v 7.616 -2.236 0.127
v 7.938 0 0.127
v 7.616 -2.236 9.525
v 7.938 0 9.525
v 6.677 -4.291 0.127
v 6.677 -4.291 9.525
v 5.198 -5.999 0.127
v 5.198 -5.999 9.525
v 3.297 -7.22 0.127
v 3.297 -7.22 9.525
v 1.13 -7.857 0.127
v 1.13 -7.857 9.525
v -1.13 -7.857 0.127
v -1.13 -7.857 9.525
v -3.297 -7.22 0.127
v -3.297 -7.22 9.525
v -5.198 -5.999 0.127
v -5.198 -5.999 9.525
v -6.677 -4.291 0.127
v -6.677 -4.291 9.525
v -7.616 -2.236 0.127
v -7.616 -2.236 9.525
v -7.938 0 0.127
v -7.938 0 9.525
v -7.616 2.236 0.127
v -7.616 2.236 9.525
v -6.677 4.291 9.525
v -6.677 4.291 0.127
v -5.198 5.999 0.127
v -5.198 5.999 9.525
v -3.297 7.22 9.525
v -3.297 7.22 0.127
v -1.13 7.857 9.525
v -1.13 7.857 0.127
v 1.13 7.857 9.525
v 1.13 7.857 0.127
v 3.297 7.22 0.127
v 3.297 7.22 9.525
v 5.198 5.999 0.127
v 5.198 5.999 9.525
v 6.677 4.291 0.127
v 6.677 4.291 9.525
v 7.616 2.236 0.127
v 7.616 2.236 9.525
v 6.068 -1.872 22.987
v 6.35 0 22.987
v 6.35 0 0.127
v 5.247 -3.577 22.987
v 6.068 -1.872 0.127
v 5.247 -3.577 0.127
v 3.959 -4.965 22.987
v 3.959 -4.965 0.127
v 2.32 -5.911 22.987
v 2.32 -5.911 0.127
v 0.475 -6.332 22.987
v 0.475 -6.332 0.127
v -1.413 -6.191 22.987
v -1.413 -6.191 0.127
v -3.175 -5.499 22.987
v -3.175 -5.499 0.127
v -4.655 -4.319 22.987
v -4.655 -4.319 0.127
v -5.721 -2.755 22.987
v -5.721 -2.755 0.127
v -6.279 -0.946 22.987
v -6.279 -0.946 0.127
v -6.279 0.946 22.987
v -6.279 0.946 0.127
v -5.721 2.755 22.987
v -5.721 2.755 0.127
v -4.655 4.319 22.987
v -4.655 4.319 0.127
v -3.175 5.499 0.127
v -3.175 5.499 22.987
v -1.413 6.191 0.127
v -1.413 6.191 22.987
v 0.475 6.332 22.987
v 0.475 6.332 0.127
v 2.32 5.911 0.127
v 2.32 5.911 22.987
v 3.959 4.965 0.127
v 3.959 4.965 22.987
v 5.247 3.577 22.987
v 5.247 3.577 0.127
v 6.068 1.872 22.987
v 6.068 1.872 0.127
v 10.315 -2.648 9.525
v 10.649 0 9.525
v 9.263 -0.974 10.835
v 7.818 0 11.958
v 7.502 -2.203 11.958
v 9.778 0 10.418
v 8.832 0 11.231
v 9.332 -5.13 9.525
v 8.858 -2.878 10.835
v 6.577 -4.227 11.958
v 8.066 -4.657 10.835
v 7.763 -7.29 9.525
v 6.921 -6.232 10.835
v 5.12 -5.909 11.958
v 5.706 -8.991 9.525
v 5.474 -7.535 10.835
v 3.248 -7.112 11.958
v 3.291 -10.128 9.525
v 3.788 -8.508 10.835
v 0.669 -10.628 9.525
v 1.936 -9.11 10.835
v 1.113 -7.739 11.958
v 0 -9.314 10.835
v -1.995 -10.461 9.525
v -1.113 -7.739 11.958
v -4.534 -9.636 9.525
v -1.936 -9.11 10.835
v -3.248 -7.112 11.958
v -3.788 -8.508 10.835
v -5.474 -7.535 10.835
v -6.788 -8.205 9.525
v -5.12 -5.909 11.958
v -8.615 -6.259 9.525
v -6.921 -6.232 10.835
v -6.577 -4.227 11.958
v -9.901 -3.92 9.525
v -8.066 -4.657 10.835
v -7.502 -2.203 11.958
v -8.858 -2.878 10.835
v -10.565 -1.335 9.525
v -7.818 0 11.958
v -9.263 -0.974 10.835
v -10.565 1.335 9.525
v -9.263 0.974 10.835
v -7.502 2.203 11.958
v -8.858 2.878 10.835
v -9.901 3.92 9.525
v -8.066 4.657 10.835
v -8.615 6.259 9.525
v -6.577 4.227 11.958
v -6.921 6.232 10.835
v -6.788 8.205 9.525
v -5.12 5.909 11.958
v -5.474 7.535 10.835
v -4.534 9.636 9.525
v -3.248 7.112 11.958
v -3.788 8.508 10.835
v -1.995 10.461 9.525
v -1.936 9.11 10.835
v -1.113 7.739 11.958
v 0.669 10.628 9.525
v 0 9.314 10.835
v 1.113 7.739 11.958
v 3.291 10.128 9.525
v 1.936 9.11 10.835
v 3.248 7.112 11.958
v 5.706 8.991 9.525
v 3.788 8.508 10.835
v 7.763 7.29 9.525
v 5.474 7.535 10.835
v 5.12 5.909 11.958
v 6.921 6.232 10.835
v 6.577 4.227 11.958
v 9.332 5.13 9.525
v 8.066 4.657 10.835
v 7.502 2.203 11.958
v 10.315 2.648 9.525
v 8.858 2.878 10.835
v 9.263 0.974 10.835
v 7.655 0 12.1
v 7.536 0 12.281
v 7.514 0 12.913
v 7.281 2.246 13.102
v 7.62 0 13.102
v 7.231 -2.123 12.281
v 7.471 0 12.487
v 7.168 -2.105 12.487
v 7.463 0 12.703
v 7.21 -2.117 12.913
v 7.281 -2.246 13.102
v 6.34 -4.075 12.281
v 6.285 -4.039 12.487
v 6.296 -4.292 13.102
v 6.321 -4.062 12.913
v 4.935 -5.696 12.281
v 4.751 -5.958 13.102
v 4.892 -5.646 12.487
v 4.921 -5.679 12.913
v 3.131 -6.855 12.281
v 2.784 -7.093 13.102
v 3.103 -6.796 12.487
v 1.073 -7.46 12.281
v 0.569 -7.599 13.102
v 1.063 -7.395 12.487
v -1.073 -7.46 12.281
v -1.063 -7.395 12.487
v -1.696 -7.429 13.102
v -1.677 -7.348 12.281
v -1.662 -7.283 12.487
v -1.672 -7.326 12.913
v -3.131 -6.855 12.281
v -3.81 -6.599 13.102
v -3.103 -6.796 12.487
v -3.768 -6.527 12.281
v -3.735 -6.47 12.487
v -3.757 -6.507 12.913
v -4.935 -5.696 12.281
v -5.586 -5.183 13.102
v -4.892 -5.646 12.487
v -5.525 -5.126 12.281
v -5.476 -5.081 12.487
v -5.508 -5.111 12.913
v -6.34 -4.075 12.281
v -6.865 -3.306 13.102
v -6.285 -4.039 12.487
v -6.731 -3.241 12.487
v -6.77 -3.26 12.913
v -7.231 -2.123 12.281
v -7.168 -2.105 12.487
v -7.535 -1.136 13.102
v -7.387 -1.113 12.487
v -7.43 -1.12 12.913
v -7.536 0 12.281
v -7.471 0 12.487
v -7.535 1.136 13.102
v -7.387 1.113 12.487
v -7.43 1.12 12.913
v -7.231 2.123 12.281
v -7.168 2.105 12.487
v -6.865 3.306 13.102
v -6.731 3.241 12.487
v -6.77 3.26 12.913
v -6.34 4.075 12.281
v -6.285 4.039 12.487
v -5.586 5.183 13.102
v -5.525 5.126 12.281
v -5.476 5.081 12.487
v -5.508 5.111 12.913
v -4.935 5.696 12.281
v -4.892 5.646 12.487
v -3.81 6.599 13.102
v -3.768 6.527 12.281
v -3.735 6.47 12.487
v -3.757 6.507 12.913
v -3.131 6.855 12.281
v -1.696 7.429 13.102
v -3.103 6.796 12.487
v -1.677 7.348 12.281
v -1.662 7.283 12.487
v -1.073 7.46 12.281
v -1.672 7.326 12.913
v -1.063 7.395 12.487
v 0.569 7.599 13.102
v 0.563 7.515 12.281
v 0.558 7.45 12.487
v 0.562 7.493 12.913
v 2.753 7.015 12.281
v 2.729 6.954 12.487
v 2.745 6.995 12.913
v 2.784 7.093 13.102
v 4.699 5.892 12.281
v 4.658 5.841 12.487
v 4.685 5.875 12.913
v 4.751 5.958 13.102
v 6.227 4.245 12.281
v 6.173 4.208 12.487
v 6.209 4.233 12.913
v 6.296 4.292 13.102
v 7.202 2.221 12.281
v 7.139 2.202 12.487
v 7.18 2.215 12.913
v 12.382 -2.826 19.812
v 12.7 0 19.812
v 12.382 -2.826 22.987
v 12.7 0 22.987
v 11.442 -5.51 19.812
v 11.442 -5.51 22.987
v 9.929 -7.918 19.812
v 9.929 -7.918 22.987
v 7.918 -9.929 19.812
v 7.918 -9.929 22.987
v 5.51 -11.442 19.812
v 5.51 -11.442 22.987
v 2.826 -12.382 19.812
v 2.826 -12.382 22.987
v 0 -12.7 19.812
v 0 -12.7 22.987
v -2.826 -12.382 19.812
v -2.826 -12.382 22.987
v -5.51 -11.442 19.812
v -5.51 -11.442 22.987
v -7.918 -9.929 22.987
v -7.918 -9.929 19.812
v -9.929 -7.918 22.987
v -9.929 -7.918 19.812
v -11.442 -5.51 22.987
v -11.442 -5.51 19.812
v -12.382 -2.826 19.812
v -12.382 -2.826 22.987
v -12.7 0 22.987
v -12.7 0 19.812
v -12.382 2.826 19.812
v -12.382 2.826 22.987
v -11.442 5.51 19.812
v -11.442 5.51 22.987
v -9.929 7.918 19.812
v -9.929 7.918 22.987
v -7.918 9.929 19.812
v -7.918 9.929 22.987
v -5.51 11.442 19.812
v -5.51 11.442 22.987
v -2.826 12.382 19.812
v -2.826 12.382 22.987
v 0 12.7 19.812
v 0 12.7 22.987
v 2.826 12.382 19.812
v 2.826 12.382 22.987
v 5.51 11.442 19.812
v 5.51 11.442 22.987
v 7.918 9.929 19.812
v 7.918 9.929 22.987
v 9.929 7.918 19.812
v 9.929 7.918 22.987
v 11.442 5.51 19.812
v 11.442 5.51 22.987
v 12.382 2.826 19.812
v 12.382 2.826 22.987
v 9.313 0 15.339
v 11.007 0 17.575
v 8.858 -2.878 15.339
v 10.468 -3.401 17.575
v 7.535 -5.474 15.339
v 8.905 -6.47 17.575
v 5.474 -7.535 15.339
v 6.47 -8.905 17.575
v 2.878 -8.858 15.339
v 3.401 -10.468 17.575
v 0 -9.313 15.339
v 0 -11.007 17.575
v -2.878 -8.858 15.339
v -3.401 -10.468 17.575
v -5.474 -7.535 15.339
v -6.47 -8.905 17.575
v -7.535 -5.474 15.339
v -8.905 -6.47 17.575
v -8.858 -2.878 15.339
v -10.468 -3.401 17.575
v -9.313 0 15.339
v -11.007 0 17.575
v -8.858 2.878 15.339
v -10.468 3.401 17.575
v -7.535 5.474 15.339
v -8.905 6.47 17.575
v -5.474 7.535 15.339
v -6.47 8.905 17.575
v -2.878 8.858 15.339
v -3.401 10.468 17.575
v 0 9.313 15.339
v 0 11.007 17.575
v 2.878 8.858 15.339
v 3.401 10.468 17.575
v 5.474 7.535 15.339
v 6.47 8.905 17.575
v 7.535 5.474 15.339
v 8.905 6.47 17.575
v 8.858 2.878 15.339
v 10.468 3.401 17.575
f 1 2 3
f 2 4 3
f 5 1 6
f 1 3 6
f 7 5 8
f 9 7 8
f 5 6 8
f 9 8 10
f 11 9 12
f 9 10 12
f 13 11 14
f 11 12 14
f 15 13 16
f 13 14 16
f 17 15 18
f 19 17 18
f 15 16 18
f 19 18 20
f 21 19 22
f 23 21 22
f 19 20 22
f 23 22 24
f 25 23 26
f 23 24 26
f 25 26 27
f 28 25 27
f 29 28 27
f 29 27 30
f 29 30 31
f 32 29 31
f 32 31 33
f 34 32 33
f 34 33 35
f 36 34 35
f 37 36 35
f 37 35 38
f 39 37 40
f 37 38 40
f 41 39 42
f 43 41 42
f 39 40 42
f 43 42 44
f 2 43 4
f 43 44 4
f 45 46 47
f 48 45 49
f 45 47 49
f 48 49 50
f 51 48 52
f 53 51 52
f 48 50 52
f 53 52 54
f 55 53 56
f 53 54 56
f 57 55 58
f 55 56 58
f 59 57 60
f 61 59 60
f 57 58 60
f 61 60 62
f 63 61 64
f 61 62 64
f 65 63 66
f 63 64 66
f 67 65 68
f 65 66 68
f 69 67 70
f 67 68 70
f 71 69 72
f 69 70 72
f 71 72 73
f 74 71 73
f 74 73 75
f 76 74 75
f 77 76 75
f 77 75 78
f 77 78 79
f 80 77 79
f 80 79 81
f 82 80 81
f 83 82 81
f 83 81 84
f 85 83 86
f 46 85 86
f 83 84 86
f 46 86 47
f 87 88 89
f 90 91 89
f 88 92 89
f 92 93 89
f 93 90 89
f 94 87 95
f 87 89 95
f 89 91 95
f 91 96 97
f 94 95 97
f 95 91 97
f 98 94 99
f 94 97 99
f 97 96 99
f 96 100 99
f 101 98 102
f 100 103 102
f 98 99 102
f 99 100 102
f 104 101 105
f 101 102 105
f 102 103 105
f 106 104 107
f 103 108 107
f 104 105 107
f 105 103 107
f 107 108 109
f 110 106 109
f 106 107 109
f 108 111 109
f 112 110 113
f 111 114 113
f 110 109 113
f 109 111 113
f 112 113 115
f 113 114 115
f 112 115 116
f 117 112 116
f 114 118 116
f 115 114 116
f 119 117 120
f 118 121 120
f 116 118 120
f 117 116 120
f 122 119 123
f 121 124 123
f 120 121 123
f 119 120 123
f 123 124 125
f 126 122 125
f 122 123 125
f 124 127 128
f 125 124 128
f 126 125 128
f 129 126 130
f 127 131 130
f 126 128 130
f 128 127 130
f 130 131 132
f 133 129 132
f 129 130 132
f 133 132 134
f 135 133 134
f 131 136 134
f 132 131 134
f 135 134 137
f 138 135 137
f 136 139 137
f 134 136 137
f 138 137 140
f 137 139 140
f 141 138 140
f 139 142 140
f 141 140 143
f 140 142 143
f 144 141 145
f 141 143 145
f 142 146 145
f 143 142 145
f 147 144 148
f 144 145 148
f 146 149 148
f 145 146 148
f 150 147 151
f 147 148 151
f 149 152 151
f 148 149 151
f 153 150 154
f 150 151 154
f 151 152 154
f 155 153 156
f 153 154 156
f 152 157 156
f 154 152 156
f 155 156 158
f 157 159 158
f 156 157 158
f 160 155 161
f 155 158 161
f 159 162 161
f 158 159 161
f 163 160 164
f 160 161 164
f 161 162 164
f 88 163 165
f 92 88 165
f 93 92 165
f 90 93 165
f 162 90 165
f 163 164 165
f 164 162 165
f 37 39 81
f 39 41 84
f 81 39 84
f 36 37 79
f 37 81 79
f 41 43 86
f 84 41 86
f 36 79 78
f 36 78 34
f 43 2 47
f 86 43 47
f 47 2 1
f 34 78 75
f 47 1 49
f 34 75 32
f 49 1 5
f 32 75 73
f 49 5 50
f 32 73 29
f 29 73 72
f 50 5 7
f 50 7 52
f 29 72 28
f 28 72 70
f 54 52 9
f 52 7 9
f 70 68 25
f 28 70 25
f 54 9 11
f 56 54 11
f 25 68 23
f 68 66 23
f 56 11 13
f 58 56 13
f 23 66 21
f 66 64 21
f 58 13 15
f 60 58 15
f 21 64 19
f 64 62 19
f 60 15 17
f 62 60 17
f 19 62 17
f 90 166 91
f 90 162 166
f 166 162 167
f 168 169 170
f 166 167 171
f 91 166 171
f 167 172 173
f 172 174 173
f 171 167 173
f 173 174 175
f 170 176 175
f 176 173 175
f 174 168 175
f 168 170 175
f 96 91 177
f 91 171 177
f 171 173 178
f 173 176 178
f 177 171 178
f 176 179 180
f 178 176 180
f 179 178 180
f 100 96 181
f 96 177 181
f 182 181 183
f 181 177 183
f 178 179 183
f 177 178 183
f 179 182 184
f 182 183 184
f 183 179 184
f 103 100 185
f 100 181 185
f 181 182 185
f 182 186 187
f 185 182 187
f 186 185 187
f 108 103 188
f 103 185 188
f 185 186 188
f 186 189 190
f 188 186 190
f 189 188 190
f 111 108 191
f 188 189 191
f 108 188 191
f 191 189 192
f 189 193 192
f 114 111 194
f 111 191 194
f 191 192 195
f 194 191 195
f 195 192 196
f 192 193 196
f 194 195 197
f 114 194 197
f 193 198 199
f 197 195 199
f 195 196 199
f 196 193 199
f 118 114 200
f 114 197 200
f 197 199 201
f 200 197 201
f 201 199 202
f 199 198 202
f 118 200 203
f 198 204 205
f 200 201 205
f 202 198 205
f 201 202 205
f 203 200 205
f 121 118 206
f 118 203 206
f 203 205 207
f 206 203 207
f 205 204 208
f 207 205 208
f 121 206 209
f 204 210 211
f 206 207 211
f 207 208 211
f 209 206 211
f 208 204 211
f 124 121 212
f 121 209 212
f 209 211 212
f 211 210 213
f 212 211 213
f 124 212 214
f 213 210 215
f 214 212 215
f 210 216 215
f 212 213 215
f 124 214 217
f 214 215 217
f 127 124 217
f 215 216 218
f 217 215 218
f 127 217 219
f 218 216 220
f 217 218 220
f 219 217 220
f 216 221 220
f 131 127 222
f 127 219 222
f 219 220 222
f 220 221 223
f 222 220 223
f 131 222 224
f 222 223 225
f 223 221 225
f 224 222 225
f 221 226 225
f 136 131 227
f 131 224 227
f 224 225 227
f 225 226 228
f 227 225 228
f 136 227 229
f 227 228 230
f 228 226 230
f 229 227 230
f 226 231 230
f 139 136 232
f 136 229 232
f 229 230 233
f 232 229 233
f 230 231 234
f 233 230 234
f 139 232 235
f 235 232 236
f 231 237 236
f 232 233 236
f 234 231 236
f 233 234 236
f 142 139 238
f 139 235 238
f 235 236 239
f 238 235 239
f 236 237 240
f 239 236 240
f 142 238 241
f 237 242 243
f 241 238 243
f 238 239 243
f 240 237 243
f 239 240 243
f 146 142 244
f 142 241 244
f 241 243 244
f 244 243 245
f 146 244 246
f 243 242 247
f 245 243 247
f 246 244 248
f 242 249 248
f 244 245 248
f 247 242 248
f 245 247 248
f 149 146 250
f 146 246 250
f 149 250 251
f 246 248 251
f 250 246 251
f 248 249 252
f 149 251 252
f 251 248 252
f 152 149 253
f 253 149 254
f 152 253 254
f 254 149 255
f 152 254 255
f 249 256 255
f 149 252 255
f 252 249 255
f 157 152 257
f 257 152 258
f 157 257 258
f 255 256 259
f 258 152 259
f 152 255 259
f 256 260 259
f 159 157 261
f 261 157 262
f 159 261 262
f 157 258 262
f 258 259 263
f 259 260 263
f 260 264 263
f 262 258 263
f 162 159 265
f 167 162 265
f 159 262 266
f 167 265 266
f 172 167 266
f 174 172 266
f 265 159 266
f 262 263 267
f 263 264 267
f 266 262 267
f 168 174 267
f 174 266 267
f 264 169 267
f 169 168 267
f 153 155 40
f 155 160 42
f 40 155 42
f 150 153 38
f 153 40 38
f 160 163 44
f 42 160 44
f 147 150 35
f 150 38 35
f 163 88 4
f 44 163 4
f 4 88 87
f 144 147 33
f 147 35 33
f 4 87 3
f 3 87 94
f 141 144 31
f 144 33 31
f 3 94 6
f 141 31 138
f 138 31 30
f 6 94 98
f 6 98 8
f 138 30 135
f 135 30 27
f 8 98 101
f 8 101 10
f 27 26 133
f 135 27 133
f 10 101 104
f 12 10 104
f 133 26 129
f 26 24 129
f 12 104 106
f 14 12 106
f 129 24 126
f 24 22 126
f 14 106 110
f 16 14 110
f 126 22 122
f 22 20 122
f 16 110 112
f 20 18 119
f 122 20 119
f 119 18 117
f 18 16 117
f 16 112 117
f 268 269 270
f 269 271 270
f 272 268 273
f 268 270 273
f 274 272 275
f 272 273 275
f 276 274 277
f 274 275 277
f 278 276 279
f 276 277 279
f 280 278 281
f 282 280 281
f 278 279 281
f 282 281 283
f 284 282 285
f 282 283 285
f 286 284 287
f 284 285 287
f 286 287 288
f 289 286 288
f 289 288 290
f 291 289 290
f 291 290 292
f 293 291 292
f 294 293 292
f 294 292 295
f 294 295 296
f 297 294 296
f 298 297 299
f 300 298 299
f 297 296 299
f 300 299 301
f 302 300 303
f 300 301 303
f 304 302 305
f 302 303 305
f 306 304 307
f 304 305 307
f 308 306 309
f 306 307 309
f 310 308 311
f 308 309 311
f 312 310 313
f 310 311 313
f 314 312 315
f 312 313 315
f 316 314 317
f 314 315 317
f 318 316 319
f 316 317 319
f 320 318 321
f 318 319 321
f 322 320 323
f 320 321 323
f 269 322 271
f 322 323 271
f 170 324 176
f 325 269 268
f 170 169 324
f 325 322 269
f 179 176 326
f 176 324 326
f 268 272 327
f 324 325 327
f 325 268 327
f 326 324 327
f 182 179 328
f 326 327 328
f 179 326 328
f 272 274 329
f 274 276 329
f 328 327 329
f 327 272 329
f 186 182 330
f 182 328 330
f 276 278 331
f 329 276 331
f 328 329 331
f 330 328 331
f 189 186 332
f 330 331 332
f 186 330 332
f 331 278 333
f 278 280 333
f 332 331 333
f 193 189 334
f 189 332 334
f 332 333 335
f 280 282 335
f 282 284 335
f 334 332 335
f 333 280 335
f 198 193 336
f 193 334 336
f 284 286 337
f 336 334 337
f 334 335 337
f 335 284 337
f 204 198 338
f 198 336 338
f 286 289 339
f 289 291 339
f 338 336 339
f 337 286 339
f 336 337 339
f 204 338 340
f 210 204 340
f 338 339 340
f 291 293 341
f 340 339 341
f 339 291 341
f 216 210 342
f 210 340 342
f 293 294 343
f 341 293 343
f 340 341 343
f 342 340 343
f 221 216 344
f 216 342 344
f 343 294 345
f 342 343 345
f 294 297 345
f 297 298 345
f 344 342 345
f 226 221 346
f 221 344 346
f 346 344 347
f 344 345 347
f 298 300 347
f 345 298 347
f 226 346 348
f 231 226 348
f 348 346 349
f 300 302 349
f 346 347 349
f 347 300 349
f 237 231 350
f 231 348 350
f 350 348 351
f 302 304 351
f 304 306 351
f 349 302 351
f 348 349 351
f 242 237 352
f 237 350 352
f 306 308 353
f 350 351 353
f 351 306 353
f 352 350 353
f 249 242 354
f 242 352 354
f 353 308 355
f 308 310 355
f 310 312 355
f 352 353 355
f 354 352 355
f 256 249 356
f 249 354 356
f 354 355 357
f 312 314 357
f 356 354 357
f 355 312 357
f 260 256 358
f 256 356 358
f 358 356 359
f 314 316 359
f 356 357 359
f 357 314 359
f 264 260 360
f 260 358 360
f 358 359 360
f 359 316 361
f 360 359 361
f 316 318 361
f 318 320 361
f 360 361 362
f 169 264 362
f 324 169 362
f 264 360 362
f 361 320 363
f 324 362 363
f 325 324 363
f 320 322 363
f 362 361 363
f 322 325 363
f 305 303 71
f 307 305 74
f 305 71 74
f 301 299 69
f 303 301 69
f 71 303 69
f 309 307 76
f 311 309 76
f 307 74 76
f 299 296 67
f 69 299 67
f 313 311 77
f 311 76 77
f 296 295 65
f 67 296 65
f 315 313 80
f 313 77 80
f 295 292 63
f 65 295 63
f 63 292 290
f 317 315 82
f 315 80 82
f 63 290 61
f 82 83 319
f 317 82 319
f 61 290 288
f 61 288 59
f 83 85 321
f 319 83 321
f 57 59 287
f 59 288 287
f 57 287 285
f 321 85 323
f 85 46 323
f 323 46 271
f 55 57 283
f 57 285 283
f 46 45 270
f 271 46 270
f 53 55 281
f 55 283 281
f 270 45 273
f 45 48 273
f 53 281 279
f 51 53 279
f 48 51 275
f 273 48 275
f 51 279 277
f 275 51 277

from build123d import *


with BuildPart() as part:
    # Sketch1 → Revolve1 (revolve)
    with BuildSketch(Plane(origin=(0, 0, 0), x_dir=(0, 0, -1), z_dir=(1, 0, 0)), mode=Mode.PRIVATE) as revolve1_sk:
        with BuildLine():
            Line((-0.127, 6.35), (-0.127, 7.9375))
            Line((-0.127, 7.9375), (-9.525, 7.9375))
            Line((-9.525, 7.9375), (-9.525, 10.649273743))
            ThreePointArc((-9.525, 10.649273743), (-10.834561548, 9.313695954), (-11.958424774, 7.818486629))
            ThreePointArc((-11.958424774, 7.818486629), (-12.487029733, 7.470791715), (-13.10188894, 7.62))
            Line((-13.10188894, 7.62), (-19.812, 12.7))
            Line((-19.812, 12.7), (-22.987, 12.7))
            Line((-22.987, 12.7), (-22.987, 6.35))
            Line((-22.987, 6.35), (-0.127, 6.35))
        make_face()
    revolve(revolve1_sk.sketch.rotate(Axis((0, 0, 47.275745838), (0, 0, -1)), 90), axis=Axis((0, 0, 47.275745838), (0, 0, -1)))


solid = part.part
